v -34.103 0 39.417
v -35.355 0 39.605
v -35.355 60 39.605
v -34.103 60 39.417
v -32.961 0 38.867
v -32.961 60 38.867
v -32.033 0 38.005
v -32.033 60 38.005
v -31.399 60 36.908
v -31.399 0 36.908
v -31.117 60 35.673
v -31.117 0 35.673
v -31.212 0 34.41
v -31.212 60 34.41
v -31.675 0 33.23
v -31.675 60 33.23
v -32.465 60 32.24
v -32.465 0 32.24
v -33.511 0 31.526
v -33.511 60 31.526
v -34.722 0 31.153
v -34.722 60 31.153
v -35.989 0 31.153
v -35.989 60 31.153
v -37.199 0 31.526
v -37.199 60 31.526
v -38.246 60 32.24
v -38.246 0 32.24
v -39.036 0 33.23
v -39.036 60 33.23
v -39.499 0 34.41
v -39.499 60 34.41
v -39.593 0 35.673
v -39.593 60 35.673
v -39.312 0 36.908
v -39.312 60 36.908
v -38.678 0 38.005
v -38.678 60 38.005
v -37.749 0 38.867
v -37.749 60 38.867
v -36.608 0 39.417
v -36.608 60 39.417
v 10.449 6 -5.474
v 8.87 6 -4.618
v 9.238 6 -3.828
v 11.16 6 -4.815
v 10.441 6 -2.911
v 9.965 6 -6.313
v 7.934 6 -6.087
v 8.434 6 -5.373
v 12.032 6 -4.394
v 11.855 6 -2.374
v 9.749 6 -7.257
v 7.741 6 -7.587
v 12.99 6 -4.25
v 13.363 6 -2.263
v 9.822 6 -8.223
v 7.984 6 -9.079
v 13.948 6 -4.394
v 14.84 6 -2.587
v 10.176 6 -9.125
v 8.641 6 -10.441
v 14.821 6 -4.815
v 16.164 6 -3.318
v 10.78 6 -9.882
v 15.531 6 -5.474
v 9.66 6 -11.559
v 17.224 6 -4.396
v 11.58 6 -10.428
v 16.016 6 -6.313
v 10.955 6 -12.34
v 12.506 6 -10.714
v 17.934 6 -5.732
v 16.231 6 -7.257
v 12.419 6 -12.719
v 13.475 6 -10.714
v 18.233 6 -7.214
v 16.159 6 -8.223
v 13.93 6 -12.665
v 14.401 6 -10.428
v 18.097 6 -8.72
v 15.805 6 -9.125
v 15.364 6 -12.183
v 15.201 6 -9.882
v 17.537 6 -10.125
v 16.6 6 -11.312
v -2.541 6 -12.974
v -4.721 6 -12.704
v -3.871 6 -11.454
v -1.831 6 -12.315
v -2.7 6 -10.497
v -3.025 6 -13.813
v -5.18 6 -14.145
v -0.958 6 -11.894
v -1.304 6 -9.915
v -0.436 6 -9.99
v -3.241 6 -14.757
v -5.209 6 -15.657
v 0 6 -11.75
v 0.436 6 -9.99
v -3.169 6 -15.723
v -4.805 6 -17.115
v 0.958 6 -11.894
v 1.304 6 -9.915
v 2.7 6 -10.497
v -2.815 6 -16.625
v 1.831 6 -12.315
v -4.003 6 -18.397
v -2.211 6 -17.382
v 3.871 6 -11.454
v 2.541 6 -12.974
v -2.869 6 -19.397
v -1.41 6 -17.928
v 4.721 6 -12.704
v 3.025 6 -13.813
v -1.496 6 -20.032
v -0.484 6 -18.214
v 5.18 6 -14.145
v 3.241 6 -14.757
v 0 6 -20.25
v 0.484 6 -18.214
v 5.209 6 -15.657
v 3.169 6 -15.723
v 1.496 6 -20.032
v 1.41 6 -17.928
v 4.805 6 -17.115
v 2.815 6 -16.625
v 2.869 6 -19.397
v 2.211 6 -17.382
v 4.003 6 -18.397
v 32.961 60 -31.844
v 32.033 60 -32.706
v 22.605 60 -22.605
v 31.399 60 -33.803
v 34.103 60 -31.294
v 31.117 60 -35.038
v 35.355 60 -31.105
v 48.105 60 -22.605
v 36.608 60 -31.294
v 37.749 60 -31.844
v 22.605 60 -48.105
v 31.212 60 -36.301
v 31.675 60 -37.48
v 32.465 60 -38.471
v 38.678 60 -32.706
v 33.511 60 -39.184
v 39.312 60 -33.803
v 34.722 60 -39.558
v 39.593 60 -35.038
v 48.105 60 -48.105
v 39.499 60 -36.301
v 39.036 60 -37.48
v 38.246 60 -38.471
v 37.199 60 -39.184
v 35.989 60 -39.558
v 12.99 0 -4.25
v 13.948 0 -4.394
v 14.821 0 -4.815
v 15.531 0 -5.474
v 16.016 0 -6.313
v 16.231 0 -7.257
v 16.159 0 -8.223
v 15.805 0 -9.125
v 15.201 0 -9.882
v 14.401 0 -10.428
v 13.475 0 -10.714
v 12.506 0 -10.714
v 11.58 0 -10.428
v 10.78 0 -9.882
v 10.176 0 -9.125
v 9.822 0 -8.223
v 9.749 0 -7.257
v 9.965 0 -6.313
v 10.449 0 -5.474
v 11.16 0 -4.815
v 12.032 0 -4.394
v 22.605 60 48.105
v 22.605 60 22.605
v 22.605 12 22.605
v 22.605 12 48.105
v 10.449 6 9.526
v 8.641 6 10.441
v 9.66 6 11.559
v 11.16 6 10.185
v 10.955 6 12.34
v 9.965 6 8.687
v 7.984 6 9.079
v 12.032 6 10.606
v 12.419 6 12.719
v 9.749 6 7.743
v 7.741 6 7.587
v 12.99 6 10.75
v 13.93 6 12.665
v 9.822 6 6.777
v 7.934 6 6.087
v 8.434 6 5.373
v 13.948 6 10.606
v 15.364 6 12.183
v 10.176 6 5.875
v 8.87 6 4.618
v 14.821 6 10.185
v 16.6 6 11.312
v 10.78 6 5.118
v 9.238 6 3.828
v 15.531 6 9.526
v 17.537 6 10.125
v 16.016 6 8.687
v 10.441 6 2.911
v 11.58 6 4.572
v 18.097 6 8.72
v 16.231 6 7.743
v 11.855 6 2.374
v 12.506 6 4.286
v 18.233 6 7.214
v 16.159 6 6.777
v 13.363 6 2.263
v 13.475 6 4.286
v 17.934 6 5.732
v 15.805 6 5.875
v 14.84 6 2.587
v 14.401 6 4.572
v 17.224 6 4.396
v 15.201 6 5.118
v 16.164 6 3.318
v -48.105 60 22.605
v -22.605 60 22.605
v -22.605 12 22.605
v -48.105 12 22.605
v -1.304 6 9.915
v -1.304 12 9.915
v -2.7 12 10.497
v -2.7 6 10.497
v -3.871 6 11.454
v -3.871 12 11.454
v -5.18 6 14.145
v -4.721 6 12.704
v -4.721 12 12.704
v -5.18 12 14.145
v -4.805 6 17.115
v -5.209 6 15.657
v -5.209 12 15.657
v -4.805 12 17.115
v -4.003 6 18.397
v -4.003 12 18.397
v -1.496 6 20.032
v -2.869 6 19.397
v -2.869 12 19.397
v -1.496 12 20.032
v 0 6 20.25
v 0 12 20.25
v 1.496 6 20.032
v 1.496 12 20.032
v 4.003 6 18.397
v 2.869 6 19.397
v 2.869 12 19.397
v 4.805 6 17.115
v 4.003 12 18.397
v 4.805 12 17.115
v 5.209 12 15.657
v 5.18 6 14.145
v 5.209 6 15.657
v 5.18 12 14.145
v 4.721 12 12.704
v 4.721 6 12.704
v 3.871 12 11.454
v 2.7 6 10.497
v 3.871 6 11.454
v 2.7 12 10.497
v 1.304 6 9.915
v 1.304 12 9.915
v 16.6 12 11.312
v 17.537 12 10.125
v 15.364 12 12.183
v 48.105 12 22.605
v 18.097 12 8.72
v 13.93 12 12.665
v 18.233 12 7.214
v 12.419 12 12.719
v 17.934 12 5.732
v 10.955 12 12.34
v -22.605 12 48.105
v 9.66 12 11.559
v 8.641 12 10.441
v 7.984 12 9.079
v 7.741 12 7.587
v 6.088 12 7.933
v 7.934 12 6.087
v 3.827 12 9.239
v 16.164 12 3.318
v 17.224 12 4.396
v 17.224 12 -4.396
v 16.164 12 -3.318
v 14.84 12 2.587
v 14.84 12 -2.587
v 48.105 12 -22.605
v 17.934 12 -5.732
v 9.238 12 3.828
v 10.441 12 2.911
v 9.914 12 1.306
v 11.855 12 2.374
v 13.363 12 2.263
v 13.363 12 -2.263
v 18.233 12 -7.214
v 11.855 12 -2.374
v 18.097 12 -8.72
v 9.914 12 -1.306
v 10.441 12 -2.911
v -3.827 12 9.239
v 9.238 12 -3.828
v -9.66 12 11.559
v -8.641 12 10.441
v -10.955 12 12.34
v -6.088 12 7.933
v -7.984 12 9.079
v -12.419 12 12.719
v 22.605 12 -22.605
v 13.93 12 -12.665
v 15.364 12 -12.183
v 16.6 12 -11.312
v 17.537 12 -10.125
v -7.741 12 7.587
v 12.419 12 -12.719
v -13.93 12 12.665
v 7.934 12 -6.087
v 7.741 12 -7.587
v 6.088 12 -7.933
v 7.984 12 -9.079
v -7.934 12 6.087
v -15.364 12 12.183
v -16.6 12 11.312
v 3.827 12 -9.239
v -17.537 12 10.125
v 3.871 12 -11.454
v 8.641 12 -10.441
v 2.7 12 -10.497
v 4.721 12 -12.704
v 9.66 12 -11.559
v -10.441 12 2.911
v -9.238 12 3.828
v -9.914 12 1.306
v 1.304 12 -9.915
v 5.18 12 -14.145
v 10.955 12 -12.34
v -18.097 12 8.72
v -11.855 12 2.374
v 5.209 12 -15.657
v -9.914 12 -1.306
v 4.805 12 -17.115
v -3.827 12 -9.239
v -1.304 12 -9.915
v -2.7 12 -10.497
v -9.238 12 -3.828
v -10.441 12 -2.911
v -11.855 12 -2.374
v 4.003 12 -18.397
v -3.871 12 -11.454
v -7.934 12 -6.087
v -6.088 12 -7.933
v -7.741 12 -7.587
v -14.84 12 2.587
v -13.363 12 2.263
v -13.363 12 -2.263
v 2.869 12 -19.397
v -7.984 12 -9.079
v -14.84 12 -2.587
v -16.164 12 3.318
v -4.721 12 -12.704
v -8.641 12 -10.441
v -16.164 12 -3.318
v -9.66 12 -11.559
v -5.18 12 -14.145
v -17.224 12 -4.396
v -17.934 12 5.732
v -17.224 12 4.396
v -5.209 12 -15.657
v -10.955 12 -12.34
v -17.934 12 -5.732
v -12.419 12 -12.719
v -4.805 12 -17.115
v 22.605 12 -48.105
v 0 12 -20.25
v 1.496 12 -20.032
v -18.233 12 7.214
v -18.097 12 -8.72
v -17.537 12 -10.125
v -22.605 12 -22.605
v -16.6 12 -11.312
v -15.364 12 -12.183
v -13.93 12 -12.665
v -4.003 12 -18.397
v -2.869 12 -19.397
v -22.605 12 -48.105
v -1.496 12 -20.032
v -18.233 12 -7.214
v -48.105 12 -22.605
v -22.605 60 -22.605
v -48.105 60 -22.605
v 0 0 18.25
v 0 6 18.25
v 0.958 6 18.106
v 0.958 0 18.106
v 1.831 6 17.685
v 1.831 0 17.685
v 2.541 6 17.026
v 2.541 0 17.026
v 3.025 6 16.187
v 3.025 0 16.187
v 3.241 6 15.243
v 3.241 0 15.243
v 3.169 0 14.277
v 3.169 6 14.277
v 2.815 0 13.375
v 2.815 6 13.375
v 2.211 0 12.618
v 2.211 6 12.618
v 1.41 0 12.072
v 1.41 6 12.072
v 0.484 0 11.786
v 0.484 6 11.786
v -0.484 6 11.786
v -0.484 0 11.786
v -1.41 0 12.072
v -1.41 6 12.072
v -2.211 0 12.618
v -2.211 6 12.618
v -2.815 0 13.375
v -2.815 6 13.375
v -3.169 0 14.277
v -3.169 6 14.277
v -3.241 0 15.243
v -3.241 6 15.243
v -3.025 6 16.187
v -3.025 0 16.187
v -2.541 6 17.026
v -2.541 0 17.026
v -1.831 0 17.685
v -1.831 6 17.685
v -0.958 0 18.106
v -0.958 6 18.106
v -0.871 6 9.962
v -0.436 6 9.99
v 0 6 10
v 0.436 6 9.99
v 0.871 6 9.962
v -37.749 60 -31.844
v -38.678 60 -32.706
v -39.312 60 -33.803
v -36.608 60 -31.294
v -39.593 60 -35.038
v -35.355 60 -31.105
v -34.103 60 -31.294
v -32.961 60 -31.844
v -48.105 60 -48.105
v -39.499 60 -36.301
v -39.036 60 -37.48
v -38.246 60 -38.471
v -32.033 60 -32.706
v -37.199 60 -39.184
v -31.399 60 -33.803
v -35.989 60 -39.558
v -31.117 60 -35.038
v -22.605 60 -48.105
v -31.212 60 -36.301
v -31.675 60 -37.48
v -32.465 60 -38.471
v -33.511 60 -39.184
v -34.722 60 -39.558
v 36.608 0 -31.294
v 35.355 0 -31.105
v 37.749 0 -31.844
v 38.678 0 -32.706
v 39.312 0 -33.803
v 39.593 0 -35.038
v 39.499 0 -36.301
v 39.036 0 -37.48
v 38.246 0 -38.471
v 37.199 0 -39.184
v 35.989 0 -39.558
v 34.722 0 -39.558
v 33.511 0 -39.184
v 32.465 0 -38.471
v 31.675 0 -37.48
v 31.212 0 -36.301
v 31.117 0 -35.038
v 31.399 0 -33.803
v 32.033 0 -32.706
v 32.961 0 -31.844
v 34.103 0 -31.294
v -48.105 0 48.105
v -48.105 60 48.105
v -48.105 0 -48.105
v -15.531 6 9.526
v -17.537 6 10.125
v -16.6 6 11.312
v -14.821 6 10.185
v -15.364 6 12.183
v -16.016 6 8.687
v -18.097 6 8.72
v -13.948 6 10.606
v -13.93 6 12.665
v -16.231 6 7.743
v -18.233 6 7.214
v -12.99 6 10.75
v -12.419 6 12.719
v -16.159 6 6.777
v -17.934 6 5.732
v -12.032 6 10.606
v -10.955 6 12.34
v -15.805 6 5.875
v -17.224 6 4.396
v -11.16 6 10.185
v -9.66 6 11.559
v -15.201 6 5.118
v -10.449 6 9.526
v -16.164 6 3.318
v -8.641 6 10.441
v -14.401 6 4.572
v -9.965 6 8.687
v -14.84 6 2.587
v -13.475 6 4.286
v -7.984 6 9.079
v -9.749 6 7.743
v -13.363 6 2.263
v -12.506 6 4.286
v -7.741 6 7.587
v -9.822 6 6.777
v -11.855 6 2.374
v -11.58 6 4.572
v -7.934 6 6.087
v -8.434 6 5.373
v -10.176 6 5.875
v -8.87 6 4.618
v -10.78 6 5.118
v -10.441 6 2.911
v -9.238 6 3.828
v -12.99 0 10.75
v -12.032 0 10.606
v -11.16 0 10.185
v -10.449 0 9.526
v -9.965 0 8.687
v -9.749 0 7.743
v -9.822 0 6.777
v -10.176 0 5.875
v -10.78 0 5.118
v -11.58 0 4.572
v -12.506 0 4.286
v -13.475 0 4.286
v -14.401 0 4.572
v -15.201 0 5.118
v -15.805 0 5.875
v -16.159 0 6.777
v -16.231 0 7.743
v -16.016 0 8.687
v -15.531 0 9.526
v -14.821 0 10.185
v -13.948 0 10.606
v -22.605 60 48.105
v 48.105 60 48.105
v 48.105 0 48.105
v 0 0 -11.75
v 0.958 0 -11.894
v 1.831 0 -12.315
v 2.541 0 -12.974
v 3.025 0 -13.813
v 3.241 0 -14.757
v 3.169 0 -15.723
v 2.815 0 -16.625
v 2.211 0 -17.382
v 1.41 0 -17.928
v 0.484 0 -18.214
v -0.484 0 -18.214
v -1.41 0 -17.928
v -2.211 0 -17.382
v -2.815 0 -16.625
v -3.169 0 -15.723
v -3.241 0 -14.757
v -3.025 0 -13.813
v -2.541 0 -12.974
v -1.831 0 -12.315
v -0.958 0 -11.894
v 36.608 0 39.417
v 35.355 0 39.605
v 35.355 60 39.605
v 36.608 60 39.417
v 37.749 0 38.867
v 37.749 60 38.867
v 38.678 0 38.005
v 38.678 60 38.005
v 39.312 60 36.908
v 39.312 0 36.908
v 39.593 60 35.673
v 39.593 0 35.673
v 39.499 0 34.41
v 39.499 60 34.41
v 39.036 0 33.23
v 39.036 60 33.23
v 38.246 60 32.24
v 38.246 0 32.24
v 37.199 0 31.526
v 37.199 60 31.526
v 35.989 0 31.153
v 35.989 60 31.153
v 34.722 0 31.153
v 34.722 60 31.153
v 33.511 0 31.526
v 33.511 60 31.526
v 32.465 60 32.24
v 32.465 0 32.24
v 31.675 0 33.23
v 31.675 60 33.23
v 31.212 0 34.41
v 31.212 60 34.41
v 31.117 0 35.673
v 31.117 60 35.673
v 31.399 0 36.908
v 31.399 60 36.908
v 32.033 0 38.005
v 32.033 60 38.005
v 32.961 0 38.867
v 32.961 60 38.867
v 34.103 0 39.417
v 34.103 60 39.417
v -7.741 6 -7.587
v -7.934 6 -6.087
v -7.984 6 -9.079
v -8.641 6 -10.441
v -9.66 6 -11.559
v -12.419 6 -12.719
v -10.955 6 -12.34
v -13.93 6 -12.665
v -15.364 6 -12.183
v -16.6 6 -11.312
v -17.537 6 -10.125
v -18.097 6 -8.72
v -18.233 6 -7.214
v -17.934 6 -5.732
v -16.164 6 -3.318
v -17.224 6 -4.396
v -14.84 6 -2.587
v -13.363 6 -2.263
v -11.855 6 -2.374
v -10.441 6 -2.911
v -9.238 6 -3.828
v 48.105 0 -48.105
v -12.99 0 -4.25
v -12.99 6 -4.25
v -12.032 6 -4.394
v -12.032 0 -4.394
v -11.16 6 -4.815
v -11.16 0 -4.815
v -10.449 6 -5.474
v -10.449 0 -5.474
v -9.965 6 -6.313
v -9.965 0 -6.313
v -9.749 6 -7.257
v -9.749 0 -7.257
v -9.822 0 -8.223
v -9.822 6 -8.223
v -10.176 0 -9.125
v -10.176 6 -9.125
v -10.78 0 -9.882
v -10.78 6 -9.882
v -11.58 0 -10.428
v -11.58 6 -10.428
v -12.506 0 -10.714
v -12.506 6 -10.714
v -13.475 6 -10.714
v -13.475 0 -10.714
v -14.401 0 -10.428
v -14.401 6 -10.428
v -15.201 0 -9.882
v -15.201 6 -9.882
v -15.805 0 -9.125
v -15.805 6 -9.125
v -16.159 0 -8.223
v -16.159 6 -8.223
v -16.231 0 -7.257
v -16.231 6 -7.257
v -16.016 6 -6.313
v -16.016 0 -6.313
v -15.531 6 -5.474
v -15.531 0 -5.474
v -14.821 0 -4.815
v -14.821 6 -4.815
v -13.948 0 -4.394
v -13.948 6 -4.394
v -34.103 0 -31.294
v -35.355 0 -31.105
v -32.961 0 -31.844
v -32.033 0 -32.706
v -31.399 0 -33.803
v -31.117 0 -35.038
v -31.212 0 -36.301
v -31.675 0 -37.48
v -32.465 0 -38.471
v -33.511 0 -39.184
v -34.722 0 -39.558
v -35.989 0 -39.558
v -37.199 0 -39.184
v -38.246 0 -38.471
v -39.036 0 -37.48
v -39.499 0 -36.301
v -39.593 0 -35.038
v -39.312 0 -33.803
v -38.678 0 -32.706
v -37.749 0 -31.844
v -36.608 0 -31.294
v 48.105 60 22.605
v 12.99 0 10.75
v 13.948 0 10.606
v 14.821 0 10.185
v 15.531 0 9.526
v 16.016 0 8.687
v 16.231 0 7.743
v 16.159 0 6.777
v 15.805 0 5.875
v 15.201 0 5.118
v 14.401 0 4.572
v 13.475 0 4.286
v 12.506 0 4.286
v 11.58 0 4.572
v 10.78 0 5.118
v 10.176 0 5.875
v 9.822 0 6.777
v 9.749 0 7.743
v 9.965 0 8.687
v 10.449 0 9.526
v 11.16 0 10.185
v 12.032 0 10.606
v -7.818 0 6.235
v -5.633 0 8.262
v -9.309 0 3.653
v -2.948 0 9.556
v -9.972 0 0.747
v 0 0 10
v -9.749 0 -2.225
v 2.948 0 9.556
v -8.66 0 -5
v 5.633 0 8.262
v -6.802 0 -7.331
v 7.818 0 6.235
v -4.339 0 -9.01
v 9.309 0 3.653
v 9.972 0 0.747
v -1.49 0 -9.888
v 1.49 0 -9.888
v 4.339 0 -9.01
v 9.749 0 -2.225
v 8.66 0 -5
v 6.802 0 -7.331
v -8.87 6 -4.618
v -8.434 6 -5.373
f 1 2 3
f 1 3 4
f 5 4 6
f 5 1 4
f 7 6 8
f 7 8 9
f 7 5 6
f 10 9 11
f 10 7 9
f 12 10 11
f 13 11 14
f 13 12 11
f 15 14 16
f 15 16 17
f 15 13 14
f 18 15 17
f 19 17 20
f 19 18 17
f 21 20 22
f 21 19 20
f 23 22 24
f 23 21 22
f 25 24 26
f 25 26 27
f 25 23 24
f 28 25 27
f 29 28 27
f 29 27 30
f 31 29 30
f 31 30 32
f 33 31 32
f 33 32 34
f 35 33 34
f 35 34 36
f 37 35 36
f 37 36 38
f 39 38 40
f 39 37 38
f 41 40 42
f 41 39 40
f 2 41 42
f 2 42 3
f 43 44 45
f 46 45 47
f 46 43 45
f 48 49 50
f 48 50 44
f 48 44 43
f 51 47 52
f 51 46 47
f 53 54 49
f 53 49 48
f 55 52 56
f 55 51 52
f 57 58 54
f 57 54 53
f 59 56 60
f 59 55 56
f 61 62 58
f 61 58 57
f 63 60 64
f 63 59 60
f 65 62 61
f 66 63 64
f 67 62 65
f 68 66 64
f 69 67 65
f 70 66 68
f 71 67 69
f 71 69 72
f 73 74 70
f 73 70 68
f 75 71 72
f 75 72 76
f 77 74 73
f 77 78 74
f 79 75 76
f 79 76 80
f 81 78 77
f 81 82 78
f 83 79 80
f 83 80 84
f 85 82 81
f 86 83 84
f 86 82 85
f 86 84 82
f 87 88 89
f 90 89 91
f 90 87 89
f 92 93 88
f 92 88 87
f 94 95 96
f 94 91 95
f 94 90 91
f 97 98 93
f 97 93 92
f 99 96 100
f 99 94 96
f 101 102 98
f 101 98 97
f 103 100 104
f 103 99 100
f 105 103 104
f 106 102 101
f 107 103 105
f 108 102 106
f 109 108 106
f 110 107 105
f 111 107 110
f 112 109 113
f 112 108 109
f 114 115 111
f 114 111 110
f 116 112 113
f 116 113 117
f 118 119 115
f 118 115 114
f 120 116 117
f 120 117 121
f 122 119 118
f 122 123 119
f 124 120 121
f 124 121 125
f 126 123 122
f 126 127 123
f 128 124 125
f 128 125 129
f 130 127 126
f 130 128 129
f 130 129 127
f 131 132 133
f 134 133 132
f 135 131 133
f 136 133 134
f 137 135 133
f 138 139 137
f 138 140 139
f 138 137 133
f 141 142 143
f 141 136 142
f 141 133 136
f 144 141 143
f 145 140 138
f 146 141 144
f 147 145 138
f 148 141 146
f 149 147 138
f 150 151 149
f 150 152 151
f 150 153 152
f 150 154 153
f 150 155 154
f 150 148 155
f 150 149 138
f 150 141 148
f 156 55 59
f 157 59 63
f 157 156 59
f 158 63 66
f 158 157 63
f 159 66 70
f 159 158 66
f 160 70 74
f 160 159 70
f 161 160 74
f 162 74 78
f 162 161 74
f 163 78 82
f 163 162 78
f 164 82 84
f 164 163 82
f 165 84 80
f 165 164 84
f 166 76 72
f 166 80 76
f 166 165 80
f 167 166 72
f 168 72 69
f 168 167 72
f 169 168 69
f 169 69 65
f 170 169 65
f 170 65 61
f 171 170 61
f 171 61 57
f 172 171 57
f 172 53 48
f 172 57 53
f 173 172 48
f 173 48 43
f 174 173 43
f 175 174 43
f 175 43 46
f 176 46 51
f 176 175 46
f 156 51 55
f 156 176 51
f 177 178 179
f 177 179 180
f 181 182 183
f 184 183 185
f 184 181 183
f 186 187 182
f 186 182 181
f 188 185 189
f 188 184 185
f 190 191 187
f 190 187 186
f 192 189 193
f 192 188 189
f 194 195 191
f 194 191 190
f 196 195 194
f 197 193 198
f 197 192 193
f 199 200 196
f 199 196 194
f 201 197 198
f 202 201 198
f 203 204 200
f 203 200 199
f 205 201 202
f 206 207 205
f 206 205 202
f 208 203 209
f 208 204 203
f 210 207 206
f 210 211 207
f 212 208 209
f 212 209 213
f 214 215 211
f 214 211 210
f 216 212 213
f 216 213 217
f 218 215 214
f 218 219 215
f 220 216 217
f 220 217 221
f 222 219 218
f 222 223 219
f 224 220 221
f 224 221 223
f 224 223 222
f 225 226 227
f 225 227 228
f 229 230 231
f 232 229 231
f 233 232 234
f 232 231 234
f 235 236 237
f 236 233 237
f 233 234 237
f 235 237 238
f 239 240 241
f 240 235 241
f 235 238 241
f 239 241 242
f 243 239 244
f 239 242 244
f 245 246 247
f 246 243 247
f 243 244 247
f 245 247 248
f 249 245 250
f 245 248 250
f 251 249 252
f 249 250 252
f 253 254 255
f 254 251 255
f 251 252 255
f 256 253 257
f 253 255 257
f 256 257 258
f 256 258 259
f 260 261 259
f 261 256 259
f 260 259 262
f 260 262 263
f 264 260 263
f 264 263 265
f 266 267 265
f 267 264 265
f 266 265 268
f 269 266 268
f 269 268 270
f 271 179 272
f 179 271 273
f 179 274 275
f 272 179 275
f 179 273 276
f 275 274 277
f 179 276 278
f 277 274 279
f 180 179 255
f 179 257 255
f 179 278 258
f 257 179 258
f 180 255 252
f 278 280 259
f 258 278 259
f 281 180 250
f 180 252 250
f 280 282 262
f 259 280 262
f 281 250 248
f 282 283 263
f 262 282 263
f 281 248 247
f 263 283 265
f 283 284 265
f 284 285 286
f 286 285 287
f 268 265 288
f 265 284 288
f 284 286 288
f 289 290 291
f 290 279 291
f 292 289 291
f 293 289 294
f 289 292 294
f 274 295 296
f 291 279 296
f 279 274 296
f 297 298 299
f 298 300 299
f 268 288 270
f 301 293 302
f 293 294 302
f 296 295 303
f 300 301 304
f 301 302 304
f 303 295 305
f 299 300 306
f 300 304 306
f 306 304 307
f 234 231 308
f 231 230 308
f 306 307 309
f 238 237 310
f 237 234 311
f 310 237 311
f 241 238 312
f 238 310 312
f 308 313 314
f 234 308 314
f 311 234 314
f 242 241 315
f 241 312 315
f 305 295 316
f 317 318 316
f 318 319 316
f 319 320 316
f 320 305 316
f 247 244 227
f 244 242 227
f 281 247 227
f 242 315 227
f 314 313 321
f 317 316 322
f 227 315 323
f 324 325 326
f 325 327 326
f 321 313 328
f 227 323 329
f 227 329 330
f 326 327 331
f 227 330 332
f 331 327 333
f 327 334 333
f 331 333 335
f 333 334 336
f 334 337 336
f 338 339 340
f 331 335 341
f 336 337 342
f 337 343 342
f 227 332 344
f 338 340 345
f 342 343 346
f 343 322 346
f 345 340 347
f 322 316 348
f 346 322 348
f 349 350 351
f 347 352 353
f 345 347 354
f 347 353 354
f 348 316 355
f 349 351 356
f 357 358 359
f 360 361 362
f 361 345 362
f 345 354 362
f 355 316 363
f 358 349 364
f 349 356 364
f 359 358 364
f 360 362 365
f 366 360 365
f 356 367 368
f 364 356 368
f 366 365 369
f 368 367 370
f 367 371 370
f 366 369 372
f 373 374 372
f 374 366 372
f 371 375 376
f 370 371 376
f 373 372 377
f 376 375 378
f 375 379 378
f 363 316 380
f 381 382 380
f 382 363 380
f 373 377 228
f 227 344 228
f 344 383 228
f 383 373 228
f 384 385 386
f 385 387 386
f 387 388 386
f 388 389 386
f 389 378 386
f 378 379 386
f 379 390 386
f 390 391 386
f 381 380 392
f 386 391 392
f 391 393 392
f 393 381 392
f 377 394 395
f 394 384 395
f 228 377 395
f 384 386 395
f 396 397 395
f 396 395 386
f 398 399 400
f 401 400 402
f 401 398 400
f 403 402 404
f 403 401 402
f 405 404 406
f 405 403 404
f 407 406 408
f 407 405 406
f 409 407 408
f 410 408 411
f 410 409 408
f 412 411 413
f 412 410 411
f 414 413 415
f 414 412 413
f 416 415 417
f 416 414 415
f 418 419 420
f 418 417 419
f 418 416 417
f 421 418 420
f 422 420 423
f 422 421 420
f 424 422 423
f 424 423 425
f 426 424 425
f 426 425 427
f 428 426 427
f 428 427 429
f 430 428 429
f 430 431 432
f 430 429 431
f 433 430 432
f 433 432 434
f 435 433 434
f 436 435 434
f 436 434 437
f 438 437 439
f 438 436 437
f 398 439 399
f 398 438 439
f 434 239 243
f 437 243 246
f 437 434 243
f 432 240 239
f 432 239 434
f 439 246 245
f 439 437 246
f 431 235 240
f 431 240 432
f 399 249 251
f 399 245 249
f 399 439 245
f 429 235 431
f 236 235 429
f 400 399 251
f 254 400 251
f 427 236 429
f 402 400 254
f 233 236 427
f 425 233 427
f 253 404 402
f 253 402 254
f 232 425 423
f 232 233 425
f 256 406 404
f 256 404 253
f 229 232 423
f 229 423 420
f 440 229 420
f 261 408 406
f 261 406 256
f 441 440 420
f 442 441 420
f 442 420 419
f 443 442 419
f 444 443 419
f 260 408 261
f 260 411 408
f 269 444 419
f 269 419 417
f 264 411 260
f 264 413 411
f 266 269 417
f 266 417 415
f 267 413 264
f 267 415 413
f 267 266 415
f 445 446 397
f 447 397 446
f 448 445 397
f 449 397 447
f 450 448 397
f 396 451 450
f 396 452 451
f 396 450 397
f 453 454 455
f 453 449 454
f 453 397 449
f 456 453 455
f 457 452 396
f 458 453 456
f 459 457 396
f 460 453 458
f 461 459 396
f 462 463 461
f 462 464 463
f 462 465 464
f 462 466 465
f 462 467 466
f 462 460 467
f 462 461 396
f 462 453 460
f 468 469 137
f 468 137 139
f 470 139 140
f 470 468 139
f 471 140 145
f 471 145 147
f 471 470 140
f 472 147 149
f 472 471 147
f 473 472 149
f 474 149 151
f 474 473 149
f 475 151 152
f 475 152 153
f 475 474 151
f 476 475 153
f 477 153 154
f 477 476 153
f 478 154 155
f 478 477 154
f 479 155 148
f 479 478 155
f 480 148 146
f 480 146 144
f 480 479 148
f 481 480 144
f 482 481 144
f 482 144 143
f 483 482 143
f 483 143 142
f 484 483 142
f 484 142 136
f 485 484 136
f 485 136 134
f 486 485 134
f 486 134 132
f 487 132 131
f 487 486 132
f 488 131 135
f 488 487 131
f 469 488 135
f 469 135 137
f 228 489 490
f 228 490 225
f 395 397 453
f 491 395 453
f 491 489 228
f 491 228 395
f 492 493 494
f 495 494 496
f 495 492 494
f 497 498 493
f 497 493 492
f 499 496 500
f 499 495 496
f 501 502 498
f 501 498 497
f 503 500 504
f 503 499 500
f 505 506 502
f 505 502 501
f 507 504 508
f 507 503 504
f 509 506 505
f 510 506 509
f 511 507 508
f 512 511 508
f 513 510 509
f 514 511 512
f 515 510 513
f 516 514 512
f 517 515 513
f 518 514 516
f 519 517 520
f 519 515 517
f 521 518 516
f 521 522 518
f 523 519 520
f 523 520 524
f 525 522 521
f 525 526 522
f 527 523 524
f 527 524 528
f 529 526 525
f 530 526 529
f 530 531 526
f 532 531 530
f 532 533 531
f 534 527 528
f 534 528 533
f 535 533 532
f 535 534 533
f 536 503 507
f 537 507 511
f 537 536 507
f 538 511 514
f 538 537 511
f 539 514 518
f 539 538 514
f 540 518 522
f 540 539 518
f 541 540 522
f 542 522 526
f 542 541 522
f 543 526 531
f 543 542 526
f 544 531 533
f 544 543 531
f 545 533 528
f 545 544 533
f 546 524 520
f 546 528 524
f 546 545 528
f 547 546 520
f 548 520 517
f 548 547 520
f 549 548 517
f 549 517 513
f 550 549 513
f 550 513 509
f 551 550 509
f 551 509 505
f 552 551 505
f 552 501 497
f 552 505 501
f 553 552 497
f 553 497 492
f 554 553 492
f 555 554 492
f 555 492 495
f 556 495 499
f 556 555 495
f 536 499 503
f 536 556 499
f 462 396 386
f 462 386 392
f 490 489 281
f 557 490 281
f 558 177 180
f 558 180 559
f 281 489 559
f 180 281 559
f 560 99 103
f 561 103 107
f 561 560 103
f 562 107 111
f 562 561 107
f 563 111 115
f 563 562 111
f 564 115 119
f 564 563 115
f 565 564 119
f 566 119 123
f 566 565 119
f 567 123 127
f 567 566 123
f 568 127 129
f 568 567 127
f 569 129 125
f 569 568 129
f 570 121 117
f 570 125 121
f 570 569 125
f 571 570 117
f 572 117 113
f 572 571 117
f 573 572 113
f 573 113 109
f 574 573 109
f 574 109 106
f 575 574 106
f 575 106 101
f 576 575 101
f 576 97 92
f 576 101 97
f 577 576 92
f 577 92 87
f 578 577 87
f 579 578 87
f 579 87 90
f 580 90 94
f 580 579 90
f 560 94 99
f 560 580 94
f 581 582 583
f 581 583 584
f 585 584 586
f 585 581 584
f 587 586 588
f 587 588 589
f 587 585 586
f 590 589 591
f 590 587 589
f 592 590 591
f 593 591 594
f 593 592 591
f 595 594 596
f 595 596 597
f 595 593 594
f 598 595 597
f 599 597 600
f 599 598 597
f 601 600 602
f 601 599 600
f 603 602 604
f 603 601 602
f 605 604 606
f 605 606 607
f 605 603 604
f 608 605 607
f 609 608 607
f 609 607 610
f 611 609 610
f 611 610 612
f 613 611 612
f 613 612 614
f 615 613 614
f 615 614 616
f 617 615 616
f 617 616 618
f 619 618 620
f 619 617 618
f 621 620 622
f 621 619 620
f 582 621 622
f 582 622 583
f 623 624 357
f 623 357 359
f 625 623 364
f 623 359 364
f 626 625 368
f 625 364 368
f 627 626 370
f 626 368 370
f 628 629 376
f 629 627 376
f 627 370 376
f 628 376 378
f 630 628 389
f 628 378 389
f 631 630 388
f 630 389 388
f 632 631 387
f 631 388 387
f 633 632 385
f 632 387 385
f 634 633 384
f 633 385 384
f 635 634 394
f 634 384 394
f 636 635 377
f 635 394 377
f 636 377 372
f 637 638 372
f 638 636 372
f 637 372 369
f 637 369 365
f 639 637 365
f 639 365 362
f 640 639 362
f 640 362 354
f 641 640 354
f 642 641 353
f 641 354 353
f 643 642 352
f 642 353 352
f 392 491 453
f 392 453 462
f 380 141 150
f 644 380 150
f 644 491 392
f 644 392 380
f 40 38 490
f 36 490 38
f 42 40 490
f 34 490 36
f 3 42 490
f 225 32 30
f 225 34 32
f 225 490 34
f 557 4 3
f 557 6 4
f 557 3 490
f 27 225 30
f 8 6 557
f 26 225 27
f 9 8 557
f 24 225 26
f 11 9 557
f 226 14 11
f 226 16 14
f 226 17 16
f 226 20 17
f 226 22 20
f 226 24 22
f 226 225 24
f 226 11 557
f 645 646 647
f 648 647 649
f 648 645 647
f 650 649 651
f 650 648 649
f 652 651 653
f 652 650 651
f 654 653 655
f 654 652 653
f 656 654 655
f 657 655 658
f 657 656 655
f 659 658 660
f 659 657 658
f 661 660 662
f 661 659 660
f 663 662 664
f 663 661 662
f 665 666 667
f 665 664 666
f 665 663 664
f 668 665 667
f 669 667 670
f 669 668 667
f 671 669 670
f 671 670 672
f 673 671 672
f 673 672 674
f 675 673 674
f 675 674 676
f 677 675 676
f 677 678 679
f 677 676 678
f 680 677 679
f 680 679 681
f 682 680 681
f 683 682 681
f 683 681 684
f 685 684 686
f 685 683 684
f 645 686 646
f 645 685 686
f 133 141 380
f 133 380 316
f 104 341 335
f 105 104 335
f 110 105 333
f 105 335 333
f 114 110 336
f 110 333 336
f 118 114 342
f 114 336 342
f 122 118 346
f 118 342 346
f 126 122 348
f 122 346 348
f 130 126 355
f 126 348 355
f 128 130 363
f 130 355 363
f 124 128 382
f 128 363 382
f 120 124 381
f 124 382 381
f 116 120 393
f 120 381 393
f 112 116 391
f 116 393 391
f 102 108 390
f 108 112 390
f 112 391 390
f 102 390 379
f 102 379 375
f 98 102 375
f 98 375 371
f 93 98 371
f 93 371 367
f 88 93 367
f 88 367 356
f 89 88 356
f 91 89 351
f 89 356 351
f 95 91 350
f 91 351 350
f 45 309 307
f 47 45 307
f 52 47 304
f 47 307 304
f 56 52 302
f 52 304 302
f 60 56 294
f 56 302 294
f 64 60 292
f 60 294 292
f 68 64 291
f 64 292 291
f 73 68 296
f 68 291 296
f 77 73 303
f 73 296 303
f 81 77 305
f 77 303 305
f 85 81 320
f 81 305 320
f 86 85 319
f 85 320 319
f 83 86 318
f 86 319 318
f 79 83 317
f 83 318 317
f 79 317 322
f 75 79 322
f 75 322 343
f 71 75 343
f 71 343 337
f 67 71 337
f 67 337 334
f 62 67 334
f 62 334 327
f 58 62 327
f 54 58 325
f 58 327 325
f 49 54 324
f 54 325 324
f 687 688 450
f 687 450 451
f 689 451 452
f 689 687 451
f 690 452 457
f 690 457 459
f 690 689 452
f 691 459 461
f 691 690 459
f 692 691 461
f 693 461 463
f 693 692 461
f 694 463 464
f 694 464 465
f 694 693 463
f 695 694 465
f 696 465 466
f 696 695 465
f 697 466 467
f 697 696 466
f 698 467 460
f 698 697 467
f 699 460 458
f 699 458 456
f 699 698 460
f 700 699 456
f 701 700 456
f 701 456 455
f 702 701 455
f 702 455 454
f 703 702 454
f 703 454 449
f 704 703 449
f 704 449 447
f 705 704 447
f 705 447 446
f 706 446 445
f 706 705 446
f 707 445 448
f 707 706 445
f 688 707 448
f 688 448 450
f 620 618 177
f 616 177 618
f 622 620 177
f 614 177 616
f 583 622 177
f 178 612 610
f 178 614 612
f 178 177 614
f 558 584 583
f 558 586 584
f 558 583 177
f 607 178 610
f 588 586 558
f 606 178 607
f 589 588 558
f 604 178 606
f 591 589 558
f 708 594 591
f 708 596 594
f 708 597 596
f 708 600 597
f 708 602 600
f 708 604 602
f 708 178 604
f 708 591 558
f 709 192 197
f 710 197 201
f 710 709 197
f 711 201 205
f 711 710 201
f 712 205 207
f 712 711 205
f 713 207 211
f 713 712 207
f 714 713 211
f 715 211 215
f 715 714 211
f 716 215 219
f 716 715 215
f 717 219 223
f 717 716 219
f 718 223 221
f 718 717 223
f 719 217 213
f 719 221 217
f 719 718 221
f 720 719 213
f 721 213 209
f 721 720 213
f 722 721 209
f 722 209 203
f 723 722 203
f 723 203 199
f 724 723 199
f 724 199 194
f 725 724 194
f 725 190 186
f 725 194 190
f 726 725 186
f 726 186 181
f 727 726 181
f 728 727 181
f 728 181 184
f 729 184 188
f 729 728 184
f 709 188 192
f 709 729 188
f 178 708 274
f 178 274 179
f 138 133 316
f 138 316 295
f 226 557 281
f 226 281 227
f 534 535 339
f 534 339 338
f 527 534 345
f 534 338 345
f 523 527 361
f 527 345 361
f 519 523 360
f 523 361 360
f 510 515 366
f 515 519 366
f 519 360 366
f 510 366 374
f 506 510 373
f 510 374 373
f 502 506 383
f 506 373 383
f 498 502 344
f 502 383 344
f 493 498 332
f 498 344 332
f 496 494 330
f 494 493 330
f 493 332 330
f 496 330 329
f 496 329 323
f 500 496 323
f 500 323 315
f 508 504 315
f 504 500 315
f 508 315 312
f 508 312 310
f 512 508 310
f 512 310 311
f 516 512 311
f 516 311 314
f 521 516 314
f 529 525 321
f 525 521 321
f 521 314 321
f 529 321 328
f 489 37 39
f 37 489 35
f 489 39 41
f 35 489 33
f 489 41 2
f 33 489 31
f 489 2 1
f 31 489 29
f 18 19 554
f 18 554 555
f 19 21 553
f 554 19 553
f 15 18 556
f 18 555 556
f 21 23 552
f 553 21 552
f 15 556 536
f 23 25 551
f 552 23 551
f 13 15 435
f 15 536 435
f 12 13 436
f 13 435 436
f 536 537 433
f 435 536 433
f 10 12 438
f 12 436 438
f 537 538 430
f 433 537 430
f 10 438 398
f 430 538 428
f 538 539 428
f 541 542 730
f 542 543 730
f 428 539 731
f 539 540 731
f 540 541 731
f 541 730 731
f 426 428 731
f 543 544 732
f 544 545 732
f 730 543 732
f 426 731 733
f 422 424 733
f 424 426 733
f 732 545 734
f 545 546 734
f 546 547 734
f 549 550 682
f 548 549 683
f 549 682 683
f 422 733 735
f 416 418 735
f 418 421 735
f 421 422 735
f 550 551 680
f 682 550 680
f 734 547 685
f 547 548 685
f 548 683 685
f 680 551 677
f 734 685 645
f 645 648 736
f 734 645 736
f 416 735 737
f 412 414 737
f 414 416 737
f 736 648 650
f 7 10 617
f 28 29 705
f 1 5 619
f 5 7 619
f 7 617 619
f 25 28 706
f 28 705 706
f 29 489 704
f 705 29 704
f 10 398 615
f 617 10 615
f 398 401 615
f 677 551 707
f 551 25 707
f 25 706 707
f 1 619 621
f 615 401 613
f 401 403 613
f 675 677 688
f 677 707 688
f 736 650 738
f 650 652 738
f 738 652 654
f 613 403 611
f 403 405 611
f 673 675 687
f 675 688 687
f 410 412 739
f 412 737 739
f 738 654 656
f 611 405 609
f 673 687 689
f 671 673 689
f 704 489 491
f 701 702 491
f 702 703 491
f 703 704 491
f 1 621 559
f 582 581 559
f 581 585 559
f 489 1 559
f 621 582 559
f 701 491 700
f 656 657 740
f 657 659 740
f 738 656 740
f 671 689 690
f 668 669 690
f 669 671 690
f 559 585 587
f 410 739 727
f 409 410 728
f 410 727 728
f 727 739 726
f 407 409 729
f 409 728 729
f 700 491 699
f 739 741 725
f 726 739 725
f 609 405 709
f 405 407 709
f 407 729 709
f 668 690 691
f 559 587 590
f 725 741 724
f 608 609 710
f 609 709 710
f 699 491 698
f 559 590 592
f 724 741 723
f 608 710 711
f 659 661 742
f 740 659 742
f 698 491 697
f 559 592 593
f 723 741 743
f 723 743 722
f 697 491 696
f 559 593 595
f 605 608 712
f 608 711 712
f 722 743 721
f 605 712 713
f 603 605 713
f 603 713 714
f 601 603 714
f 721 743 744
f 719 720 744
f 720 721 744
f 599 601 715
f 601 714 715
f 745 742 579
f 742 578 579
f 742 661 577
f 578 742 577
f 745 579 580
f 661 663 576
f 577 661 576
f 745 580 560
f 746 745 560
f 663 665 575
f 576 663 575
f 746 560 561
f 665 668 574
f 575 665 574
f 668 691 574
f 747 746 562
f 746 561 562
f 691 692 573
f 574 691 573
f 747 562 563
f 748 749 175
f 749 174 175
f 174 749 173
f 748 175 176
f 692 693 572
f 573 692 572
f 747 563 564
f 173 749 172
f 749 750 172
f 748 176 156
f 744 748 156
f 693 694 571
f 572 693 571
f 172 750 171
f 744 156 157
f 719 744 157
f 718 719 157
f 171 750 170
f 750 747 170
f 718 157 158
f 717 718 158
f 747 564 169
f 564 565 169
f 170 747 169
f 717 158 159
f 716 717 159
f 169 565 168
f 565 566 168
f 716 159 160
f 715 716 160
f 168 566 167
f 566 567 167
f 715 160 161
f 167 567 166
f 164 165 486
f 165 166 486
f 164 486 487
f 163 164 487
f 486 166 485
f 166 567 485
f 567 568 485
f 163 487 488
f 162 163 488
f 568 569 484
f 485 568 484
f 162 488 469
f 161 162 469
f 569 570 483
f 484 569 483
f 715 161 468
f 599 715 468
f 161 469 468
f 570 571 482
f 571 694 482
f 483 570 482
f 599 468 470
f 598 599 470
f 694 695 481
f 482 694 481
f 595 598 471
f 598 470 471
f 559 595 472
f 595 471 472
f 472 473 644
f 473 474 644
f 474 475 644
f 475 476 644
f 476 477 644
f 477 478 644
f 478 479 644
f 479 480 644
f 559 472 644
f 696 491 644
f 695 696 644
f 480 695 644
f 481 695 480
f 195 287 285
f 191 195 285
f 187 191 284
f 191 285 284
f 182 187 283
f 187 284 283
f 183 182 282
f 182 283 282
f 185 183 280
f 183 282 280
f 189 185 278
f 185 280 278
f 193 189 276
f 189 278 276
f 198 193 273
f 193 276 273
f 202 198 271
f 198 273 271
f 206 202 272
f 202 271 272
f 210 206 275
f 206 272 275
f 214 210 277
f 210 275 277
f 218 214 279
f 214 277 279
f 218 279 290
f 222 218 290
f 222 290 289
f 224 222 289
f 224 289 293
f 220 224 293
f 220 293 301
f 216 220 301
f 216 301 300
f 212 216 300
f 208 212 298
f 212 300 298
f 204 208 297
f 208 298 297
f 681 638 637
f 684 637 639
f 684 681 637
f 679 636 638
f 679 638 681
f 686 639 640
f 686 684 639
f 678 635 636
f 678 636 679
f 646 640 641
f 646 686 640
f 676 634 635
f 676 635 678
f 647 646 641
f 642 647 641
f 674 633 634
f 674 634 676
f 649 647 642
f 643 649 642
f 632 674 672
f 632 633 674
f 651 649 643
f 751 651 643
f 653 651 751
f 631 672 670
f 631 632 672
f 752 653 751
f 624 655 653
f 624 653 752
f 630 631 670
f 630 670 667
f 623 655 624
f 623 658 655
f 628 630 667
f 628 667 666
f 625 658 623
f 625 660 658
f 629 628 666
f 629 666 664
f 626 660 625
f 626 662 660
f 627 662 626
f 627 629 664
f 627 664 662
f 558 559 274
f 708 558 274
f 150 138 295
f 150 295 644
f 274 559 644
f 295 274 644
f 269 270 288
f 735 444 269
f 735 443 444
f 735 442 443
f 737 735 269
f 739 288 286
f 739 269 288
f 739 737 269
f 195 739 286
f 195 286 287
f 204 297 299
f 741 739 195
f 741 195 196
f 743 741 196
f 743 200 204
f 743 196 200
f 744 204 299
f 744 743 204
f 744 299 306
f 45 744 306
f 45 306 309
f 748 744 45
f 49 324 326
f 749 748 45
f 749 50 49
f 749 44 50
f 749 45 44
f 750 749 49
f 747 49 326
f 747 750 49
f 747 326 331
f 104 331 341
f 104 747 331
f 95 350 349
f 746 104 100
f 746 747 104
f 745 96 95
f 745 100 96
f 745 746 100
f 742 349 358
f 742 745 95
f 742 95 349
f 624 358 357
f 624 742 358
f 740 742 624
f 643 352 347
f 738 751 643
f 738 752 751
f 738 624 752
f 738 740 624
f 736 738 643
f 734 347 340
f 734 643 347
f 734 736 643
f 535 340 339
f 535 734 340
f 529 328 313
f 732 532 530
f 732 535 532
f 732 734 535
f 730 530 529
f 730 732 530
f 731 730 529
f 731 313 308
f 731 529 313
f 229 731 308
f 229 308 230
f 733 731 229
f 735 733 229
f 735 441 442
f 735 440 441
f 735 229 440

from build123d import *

# Parameters (mm, degrees)
SKETCH1_W           = 96.210678118
SKETCH1_H           = 96.210678118
SKETCH1_R           = 10
SKETCH1_R_2         = 3.25
SKETCH1_R_3         = 4.25
BOSS_EXTRUDE1_DEPTH = 60
CUT_EXTRUDE2_DEPTH  = 48
SKETCH2_R           = 5.25
CUT_EXTRUDE3_DEPTH  = 54


with BuildPart() as part:
    # Sketch1 → Boss-Extrude1 (new body)
    with BuildSketch(Plane(origin=(0, 0, 0), x_dir=(1, 0, 0), z_dir=(0, 1, 0))):
        Rectangle(SKETCH1_W, SKETCH1_H)
        with Locations(Location((0, 0, 0), (0, 0, 270))):
            Circle(SKETCH1_R, mode=Mode.SUBTRACT)
        with Locations(Location((0, 15, 0), (0, 0, 270))):
            Circle(SKETCH1_R_2, mode=Mode.SUBTRACT)
        with Locations(Location((35.355339059, 35.355339059, 0), (0, 0, 270))):
            Circle(SKETCH1_R_3, mode=Mode.SUBTRACT)
        with Locations(Location((12.990381057, 7.5, 0), (0, 0, 270))):
            Circle(SKETCH1_R_2, mode=Mode.SUBTRACT)
        with Locations(Location((12.990381057, -7.5, 0), (0, 0, 270))):
            Circle(SKETCH1_R_2, mode=Mode.SUBTRACT)
        with Locations(Location((0, -15, 0), (0, 0, 270))):
            Circle(SKETCH1_R_2, mode=Mode.SUBTRACT)
        with Locations(Location((-12.990381057, -7.5, 0), (0, 0, 270))):
            Circle(SKETCH1_R_2, mode=Mode.SUBTRACT)
        with Locations(Location((-12.990381057, 7.5, 0), (0, 0, 270))):
            Circle(SKETCH1_R_2, mode=Mode.SUBTRACT)
        with Locations(Location((35.355339059, -35.355339059, 0), (0, 0, 270))):
            Circle(SKETCH1_R_3, mode=Mode.SUBTRACT)
        with Locations(Location((-35.355339059, -35.355339059, 0), (0, 0, 270))):
            Circle(SKETCH1_R_3, mode=Mode.SUBTRACT)
        with Locations(Location((-35.355339059, 35.355339059, 0), (0, 0, 270))):
            Circle(SKETCH1_R_3, mode=Mode.SUBTRACT)
    extrude(amount=BOSS_EXTRUDE1_DEPTH)

    # Sketch4 → Cut-Extrude2 (cut)
    with BuildSketch(Plane(origin=(0, 60, 0), x_dir=(1, 0, 0), z_dir=(0, 1, 0))):
        Polygon((-22.605339059, 48.105339059), (22.605339059, 48.105339059), (22.605339059, 22.605339059), (48.105339059, 22.605339059), (48.105339059, -22.605339059), (22.605339059, -22.605339059), (22.605339059, -48.105339059), (-22.605339059, -48.105339059), (-22.605339059, -22.605339059), (-48.105339059, -22.605339059), (-48.105339059, 22.605339059), (-22.605339059, 22.605339059), align=None)
    extrude(amount=-CUT_EXTRUDE2_DEPTH, mode=Mode.SUBTRACT)

    # Sketch2 → Cut-Extrude3 (cut)
    with BuildSketch(Plane(origin=(0, 60, 0), x_dir=(1, 0, 0), z_dir=(0, 1, 0))):
        with Locations((-12.990381057, 7.5)):
            Circle(SKETCH2_R)
        with Locations((0, 15)):
            Circle(SKETCH2_R)
        with Locations((12.990381057, 7.5)):
            Circle(SKETCH2_R)
        with Locations((12.990381057, -7.5)):
            Circle(SKETCH2_R)
        with Locations((0, -15)):
            Circle(SKETCH2_R)
        with Locations((-12.990381057, -7.5)):
            Circle(SKETCH2_R)
    extrude(amount=-CUT_EXTRUDE3_DEPTH, mode=Mode.SUBTRACT)


solid = part.part
